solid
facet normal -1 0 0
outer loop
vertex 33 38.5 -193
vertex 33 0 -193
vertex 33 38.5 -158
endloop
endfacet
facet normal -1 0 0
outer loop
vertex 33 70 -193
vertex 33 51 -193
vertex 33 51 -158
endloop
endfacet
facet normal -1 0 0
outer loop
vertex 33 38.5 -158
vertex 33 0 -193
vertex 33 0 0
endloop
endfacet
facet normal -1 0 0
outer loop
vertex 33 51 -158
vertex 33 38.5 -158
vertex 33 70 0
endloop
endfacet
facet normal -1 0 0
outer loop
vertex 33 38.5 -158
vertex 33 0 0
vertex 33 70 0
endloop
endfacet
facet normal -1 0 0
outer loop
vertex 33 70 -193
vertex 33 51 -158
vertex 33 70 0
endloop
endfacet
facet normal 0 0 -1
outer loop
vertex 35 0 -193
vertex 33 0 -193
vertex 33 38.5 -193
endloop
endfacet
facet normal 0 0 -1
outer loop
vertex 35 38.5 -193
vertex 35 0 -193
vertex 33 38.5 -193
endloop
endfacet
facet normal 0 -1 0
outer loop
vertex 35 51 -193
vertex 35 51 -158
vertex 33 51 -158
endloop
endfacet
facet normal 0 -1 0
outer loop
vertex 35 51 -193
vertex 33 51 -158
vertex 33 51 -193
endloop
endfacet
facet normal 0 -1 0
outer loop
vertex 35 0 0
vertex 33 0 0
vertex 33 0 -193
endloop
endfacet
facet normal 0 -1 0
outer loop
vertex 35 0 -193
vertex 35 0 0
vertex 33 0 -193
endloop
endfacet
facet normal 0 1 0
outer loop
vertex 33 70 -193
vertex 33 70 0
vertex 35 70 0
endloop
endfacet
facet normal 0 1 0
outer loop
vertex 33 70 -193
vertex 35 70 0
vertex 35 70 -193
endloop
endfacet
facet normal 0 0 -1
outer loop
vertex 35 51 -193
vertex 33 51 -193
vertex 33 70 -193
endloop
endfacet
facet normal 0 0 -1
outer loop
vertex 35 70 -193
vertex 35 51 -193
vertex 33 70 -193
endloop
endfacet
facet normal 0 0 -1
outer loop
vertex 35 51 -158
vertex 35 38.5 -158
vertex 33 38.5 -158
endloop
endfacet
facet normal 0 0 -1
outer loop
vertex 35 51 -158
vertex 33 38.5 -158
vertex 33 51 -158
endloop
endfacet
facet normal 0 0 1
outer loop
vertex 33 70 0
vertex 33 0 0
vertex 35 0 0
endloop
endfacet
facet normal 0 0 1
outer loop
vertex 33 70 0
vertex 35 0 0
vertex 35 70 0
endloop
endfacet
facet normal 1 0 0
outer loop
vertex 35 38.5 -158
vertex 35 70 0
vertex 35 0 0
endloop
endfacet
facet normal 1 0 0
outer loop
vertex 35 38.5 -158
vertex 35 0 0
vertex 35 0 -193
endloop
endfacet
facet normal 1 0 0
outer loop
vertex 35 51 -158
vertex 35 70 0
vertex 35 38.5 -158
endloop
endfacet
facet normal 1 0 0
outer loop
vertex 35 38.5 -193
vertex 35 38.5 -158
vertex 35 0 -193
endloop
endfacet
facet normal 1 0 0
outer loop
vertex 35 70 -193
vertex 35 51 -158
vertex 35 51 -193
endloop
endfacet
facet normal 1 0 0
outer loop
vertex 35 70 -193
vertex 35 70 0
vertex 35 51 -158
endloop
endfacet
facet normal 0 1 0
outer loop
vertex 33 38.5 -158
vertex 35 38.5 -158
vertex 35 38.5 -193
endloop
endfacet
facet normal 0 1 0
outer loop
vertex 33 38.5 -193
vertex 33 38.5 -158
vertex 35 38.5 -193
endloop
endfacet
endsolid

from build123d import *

# Parameters (mm, degrees)
SKETCH1_W           = 193
SKETCH1_H           = 70
BOSS_EXTRUDE1_DEPTH = 35
SKETCH2_W           = 33
SKETCH2_H           = 70
CUT_EXTRUDE1_DEPTH  = 194
SKETCH3_W           = 35
SKETCH3_H           = 12.5
CUT_EXTRUDE2_DEPTH  = 10


with BuildPart() as part:
    # Sketch1 → Boss-Extrude1 (new body)
    with BuildSketch(Plane(origin=(0, 0, 0), x_dir=(0, 0, -1), z_dir=(1, 0, 0))):
        with Locations((96.5, 35)):
            Rectangle(SKETCH1_W, SKETCH1_H)
    extrude(amount=BOSS_EXTRUDE1_DEPTH)

    # Sketch2 → Cut-Extrude1 (cut, through all)
    with BuildSketch(Plane.XY):
        with Locations((16.5, 35)):
            Rectangle(SKETCH2_W, SKETCH2_H)
    extrude(amount=-CUT_EXTRUDE1_DEPTH, mode=Mode.SUBTRACT)

    # Sketch3 → Cut-Extrude2 (cut)
    with BuildSketch(Plane(origin=(35, 0, 0), x_dir=(0, 0, -1), z_dir=(1, 0, 0))):
        with Locations((175.5, 44.75)):
            Rectangle(SKETCH3_W, SKETCH3_H)
    extrude(amount=-CUT_EXTRUDE2_DEPTH, mode=Mode.SUBTRACT)


solid = part.part
